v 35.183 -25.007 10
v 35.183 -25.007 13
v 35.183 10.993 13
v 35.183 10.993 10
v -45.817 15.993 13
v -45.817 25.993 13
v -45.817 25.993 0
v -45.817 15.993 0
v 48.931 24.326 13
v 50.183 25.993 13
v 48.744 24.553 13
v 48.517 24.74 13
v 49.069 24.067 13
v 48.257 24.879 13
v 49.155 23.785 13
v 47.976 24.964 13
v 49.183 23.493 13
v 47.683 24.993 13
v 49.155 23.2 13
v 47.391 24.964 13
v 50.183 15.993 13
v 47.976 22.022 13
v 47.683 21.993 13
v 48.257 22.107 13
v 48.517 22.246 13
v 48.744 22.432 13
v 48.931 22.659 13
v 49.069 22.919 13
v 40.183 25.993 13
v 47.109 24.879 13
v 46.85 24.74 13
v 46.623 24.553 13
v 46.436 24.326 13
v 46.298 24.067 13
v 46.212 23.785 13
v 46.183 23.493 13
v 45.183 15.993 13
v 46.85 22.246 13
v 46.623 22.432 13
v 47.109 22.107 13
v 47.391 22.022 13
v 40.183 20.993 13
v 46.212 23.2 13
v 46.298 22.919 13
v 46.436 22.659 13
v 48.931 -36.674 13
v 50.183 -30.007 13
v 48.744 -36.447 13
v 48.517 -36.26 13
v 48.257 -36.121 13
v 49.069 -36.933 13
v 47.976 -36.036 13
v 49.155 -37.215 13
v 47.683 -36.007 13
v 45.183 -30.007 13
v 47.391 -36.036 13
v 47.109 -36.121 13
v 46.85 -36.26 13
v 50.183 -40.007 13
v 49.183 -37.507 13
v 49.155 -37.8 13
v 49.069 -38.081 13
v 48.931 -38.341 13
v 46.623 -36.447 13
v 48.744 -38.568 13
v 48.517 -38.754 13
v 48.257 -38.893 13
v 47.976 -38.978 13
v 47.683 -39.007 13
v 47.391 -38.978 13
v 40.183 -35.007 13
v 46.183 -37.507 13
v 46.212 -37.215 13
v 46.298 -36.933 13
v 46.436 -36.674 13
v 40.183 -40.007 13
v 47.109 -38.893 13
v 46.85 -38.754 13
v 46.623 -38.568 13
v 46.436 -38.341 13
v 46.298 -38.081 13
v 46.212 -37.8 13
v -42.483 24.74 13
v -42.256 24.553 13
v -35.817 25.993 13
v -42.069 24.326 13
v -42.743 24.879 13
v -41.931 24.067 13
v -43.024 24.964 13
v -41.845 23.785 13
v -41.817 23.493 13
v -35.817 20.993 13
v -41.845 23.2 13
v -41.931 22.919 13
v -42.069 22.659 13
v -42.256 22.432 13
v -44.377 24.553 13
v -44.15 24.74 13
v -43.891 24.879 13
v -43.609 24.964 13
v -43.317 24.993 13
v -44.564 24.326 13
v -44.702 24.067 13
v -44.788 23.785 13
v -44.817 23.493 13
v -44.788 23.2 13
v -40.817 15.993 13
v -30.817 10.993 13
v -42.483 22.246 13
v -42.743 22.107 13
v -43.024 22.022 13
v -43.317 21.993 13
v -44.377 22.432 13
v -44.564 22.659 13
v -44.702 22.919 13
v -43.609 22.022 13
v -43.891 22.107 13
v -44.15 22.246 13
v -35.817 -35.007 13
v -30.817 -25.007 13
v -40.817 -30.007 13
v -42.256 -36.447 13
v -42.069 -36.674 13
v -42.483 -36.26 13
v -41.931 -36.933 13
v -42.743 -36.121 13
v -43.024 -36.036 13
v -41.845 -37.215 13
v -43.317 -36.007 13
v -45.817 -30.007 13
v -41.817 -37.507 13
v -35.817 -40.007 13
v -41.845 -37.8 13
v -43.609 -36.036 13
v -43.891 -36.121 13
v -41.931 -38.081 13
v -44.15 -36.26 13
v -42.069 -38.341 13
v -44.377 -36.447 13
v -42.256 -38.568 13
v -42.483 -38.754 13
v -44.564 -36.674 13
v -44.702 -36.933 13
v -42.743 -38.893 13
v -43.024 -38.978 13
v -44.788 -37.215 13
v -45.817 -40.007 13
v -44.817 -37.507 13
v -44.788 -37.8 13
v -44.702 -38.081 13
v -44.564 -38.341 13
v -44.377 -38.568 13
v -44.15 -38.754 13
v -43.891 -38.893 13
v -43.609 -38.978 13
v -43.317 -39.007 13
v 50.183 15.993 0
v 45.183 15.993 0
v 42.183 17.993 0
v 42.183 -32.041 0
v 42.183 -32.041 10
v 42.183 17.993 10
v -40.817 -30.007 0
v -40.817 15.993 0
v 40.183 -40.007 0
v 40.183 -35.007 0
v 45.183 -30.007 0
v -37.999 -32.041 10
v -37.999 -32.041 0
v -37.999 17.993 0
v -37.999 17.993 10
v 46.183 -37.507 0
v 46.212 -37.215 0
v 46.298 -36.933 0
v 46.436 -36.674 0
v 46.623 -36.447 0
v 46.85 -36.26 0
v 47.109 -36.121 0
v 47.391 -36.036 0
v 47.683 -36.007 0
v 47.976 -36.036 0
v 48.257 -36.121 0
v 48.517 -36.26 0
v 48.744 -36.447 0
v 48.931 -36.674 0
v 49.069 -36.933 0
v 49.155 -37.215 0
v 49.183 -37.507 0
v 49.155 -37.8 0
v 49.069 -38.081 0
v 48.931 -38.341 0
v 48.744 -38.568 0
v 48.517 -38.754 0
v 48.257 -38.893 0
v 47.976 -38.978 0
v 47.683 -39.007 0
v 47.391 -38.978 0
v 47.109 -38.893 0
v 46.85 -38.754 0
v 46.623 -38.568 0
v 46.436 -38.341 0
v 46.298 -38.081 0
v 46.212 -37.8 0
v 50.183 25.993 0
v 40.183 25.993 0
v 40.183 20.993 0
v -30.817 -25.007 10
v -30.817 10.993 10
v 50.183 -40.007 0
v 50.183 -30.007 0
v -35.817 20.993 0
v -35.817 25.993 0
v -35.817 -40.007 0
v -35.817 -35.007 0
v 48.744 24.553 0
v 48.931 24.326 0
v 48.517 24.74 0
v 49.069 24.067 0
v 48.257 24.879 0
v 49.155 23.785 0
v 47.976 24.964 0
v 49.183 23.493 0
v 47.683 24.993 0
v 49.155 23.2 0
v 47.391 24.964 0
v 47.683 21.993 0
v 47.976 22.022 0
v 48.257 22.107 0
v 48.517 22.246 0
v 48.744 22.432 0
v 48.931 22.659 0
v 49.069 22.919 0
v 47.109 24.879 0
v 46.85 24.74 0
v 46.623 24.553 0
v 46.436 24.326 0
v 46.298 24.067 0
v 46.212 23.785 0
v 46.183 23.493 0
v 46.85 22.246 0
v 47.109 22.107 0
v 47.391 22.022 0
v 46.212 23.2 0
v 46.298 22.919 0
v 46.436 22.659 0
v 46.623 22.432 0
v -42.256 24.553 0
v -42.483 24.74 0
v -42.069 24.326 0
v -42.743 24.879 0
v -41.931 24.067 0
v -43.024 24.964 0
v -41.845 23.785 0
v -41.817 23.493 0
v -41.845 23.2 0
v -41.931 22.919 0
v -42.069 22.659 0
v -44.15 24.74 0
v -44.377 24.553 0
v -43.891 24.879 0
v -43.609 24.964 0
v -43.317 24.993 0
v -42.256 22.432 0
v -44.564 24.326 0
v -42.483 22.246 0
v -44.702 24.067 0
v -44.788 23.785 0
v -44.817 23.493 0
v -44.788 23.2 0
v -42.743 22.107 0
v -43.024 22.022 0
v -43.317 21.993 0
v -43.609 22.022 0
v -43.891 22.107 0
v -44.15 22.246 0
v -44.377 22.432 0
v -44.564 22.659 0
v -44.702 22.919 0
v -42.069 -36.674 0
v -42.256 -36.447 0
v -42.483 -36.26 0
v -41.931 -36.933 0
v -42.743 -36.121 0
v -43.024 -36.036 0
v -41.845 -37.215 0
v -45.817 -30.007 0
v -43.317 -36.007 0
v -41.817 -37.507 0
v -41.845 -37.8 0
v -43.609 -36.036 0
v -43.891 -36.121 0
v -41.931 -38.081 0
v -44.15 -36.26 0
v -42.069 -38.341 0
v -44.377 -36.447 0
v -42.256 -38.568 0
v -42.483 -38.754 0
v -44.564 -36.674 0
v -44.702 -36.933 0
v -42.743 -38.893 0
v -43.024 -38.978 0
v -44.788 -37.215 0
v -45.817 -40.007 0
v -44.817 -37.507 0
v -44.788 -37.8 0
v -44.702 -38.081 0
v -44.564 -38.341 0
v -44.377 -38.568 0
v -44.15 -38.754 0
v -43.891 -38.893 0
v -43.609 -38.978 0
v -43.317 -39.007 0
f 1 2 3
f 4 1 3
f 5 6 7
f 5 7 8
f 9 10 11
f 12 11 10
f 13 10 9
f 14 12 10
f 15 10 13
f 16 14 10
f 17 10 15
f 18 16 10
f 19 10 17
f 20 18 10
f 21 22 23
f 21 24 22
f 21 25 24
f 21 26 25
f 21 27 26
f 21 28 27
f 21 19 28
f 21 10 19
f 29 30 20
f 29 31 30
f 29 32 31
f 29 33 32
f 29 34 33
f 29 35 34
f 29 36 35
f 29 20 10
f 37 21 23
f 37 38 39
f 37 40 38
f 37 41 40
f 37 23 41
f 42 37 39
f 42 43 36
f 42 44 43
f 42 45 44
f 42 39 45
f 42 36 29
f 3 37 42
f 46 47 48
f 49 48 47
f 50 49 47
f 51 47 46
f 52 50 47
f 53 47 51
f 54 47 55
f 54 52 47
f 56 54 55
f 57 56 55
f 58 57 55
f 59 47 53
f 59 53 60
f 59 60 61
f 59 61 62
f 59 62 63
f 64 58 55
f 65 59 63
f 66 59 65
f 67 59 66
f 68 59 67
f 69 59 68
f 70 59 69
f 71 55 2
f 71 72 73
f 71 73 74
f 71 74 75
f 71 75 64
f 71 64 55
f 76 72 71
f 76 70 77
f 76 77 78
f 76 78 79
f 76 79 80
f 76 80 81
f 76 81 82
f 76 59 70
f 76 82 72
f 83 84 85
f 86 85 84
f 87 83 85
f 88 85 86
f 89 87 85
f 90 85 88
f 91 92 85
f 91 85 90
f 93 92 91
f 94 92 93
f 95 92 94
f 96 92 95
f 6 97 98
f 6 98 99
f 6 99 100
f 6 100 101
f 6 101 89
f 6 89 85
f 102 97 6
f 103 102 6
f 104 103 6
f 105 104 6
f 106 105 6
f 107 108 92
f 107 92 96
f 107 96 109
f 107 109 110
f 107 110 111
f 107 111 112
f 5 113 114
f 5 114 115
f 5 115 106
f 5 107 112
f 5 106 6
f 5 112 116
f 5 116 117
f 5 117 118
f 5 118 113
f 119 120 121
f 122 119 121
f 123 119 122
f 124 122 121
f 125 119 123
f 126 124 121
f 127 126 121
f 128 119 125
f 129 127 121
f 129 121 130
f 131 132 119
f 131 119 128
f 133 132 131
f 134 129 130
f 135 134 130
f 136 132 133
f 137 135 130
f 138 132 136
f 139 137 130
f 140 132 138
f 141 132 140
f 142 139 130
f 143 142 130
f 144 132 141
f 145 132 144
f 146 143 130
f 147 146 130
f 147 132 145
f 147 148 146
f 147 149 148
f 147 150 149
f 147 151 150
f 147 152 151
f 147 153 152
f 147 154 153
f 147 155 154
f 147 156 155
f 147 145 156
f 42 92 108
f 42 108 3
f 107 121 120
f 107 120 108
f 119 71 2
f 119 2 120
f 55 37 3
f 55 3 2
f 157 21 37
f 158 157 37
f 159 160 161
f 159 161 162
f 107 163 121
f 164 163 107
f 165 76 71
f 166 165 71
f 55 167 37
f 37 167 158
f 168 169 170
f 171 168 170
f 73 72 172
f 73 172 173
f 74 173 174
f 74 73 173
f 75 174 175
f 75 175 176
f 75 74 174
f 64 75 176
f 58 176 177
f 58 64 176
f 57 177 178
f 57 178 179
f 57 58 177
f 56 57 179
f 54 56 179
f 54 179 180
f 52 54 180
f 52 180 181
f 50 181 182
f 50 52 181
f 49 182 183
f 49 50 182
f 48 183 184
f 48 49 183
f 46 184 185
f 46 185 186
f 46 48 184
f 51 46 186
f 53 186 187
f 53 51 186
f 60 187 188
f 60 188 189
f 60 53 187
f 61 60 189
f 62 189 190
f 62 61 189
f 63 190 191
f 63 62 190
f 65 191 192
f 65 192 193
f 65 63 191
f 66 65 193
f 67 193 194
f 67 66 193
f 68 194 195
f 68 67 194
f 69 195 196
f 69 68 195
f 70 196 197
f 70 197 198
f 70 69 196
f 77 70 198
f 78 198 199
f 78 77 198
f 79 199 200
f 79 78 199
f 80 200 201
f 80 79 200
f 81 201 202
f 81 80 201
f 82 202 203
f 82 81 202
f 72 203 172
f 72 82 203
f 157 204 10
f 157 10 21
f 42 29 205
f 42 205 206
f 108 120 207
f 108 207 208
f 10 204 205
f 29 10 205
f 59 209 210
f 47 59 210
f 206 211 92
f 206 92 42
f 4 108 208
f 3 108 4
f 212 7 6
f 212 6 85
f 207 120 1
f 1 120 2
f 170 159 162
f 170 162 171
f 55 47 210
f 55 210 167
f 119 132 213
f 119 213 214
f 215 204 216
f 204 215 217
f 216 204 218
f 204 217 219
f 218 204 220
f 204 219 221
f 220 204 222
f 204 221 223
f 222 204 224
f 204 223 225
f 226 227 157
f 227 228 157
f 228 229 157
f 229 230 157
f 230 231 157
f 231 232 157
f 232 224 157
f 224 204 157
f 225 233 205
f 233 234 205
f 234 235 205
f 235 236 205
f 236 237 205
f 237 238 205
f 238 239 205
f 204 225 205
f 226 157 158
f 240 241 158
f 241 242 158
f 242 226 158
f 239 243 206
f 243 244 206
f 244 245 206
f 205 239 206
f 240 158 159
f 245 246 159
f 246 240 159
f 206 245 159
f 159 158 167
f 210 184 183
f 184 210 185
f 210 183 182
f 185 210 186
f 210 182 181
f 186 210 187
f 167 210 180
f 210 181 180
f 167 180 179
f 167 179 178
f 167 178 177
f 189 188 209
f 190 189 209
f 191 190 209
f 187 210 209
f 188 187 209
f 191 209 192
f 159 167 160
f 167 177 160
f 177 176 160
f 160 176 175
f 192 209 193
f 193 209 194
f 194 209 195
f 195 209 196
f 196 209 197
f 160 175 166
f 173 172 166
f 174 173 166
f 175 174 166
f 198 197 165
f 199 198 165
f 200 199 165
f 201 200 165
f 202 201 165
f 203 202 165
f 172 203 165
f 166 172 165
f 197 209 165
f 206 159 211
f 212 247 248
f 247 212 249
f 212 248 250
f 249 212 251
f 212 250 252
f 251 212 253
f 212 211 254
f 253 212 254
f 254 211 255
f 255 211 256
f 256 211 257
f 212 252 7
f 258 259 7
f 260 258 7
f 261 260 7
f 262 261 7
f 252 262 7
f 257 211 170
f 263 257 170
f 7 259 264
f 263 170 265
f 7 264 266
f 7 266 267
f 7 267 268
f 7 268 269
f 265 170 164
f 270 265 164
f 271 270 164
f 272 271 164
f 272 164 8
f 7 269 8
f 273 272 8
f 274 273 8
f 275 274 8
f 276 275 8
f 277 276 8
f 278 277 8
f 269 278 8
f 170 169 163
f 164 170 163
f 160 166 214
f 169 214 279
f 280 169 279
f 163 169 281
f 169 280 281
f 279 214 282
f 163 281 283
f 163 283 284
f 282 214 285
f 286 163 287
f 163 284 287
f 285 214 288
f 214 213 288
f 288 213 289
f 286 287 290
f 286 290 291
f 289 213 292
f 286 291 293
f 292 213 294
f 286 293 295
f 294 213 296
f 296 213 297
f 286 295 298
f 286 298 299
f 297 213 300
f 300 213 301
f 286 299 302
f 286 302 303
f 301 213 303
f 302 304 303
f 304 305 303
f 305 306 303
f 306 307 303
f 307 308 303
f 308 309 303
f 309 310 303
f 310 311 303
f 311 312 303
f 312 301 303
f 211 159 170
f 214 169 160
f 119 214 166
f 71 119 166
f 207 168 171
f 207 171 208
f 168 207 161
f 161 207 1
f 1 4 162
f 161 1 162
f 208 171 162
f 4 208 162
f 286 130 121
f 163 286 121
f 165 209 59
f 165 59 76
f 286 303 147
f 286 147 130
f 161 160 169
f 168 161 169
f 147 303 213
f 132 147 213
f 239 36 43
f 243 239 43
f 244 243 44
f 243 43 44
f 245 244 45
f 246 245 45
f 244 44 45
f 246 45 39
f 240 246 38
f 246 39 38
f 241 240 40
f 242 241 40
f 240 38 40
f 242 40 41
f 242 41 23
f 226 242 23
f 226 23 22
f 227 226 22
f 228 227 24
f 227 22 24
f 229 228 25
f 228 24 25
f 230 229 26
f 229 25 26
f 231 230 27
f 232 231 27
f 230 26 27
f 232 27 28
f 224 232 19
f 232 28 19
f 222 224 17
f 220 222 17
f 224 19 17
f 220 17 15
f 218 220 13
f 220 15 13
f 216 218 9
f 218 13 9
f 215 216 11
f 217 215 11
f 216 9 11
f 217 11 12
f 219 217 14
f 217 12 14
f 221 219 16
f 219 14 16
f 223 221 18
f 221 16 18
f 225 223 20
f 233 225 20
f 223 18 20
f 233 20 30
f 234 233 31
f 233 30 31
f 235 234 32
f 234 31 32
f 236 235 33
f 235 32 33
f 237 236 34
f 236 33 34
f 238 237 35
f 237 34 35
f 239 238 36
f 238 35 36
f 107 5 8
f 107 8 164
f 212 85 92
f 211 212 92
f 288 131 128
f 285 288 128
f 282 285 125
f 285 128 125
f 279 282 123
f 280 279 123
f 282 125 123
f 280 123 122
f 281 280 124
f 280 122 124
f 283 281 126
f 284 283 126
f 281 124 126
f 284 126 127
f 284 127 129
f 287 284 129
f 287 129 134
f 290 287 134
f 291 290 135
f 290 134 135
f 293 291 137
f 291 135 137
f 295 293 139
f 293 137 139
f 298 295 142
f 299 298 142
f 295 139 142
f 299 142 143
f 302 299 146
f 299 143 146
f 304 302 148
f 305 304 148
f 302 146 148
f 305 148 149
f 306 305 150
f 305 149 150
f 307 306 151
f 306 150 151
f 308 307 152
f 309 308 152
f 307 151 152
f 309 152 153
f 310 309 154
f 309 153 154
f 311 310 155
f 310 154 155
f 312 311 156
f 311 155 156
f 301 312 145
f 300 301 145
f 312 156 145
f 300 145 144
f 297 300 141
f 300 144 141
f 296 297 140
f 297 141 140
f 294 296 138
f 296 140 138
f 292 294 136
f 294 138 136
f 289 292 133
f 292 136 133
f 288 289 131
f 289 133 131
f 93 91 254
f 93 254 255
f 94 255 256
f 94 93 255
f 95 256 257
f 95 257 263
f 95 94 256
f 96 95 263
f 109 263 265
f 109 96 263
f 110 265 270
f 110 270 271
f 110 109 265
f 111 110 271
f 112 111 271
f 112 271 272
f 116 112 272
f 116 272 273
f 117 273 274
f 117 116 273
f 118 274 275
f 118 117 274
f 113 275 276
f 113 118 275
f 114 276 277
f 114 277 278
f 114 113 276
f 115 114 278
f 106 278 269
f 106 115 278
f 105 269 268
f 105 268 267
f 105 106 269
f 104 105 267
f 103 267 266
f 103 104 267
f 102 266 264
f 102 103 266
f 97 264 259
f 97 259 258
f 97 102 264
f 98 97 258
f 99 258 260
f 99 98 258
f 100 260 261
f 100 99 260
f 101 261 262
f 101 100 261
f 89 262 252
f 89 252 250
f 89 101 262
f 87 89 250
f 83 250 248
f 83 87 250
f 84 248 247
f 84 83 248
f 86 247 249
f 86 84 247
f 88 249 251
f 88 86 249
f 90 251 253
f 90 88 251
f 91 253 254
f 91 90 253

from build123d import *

# Parameters (mm, degrees)
SKETCH1_W               = 86
SKETCH1_H               = 56
SKETCH1_W_2             = 80
SKETCH1_H_2             = 50
BOSS_EXTRUDE1_DEPTH     = 10
SKETCH2_W               = 86
SKETCH2_H               = 56
BOSS_EXTRUDE2_DEPTH     = 3
SKETCH3_W               = 66
SKETCH3_H               = 36
CUT_EXTRUDE1_DEPTH      = 1
CUT_EXTRUDE1_DEPTH_BACK = 14
SKETCH4_W               = 10
SKETCH4_H               = 10
SKETCH4_R               = 1.5
BOSS_EXTRUDE4_DEPTH     = 13
MIRROR6_COPY_1_SKETCH_W = 10
MIRROR6_COPY_1_SKETCH_H = 10
MIRROR6_COPY_1_SKETCH_R = 1.5
MIRROR6_COPY_1_DEPTH    = 13
SKETCH7_W               = 80.18262614
SKETCH7_H               = 50.033838124
CUT_EXTRUDE3_DEPTH      = 10


with BuildPart() as part:
    # Sketch1 → Boss-Extrude1 (new body)
    with BuildSketch(Plane.XY):
        with Locations((2.183359052, -7.007168459)):
            Rectangle(SKETCH1_W, SKETCH1_H)
        with Locations((2.183359052, -7.007168459)):
            Rectangle(SKETCH1_W_2, SKETCH1_H_2, mode=Mode.SUBTRACT)
    extrude(amount=BOSS_EXTRUDE1_DEPTH)

    # Sketch2 → Boss-Extrude2 (add)
    with BuildSketch(Plane.XY.offset(10)):
        with Locations((2.183359052, -7.007168459)):
            Rectangle(SKETCH2_W, SKETCH2_H)
    extrude(amount=BOSS_EXTRUDE2_DEPTH)

    # Sketch3 → Cut-Extrude1 (cut, two sides)
    with BuildSketch(Plane.XY.offset(13)) as cut_extrude1_sk:
        with Locations((2.183359052, -7.007168459)):
            Rectangle(SKETCH3_W, SKETCH3_H)
    extrude(amount=CUT_EXTRUDE1_DEPTH, mode=Mode.SUBTRACT)
    extrude(cut_extrude1_sk.sketch, amount=-CUT_EXTRUDE1_DEPTH_BACK, mode=Mode.SUBTRACT)

    # Sketch4 → Boss-Extrude4 (add)
    with BuildSketch(Plane.XY.offset(13)):
        with Locations((-40.816640948, -35.007168459)):
            Rectangle(SKETCH4_W, SKETCH4_H)
        with Locations((-43.316640948, -37.507168459)):
            Circle(SKETCH4_R, mode=Mode.SUBTRACT)
    boss_extrude4 = extrude(amount=-BOSS_EXTRUDE4_DEPTH)

    # Mirror5: Boss-Extrude4 across plane
    add(boss_extrude4.mirror(Plane.ZY.offset(-2.183359052)))

    # Mirror6: Boss-Extrude4 across plane
    add(boss_extrude4.mirror(Plane(origin=(0, -7.007168459, 0), x_dir=(0, 0, 1), z_dir=(0, -1, 0))))

    # Mirror6 copy 1 sketch → Mirror6 copy 1 (add)
    with BuildSketch(Plane(origin=(4.366718103, -14.014336918, 13), x_dir=(-1, 0, 0), z_dir=(0, 0, 1))):
        with Locations((-40.816640948, -35.007168459)):
            Rectangle(MIRROR6_COPY_1_SKETCH_W, MIRROR6_COPY_1_SKETCH_H)
        with Locations((-43.316640948, -37.507168459)):
            Circle(MIRROR6_COPY_1_SKETCH_R, mode=Mode.SUBTRACT)
    extrude(amount=-MIRROR6_COPY_1_DEPTH)

    # Sketch7 → Cut-Extrude3 (cut)
    with BuildSketch(Plane(origin=(0, 0, 0), x_dir=(-1, 0, 0), z_dir=(0, 0, -1))):
        with Locations((-2.092045982, -7.024087521)):
            Rectangle(SKETCH7_W, SKETCH7_H)
    extrude(amount=-CUT_EXTRUDE3_DEPTH, mode=Mode.SUBTRACT)


solid = part.part
